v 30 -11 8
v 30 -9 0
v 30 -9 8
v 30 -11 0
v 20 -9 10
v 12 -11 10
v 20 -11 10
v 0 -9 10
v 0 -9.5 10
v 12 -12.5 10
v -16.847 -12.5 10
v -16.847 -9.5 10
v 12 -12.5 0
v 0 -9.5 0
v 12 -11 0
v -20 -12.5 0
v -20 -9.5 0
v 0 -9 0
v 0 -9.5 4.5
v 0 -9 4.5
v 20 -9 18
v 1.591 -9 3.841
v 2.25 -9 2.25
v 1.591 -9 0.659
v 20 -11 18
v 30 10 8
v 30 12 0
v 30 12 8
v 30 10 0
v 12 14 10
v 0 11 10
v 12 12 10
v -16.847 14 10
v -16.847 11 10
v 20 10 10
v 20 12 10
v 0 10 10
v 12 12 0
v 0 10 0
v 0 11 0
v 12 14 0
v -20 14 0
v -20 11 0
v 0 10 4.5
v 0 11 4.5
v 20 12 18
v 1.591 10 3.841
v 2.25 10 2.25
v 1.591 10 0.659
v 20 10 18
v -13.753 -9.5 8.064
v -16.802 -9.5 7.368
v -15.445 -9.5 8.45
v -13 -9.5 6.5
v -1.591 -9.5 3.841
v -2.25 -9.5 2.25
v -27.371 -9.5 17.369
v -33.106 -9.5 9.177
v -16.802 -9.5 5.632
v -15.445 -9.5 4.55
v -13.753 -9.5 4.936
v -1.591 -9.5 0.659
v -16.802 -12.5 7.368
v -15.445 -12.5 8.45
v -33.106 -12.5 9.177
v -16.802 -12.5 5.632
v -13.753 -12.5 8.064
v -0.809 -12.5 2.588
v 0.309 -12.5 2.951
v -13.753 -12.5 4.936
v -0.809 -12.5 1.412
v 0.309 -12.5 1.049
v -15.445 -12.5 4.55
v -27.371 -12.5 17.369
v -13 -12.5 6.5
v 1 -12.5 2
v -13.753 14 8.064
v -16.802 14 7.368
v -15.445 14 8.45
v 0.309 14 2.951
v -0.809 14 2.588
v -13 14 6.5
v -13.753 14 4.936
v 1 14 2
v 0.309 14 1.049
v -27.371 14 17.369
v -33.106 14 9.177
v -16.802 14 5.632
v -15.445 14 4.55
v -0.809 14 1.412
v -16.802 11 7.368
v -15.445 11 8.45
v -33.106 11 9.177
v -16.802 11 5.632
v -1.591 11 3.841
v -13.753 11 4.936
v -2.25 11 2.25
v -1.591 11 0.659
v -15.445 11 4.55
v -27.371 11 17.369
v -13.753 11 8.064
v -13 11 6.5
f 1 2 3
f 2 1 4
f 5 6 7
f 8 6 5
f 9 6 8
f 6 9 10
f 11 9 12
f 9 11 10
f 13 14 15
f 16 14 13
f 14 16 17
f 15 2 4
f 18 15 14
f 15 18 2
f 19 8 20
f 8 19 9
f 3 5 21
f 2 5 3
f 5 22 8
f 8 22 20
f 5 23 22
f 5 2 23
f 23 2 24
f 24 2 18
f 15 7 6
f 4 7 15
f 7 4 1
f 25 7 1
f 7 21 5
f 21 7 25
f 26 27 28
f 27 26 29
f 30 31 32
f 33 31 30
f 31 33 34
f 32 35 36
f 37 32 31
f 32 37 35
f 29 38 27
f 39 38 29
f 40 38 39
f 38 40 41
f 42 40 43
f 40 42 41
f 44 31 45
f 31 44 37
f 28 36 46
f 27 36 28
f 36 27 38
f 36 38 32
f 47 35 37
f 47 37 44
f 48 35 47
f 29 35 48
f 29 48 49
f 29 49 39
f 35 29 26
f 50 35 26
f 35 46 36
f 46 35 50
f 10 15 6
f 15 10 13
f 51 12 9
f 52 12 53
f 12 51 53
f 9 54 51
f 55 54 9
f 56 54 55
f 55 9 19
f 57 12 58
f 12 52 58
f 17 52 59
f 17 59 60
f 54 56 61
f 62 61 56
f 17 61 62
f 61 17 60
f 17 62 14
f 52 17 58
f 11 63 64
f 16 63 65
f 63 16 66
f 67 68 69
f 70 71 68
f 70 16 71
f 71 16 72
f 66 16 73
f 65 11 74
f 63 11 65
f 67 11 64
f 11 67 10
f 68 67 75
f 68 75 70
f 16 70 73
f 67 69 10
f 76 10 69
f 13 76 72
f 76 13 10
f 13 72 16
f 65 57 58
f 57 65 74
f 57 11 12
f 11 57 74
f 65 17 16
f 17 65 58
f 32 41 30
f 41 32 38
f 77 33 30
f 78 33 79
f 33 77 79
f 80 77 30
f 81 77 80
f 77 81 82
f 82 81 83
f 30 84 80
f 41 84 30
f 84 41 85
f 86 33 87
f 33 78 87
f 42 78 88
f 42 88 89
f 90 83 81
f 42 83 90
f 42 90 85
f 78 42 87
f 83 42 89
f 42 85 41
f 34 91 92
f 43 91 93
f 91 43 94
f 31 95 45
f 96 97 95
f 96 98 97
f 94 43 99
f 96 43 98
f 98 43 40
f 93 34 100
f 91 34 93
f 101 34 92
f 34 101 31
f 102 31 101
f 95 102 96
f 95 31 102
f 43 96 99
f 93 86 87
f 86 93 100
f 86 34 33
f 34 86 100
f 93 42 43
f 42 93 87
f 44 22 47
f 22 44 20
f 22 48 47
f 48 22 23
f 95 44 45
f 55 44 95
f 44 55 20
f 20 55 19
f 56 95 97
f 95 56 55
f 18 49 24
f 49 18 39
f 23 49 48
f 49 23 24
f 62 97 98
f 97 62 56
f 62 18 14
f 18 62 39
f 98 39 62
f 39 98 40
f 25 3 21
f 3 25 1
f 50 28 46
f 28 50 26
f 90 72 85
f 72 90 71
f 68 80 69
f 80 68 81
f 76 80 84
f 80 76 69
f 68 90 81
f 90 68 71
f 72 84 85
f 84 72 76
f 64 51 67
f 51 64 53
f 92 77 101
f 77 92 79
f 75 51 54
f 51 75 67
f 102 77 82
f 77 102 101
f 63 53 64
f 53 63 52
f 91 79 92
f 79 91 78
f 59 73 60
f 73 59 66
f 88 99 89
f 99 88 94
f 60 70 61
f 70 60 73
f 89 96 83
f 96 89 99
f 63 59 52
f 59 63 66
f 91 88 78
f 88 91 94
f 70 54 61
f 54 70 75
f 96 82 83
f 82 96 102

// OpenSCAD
//rotate([0,180,0]) {
//    difference() {
//        translate([1.5,0,0])cube([27,50,15]);
//        color([1,0,0])translate([1,10,0])cube([28,30,8]);
//
//        color([0,1,0])translate([7,0,0])cube([16,50,15]);
//        color([0,1,0])translate([4.5,0,0])cube([21,30,15]);
//        color([0,0,1])rotate([0,90,0])translate([-5,5,-3])cylinder(40,d1=4,d2=4);
//        color([0,0,1])rotate([0,90,0])translate([-5,45,-3])cylinder(40,d1=4,d2=4);
//    }
//    color([0,0,1])rotate([0,90,0])translate([-13,20,1])cylinder(28,d1=4,d2=4);
//}

module drawTrigger() {
difference() {
  union() {
    //left arm
    translate([0,-11,0]) cube([30,2,10]);
    translate([20,-11,0]) cube([10,2,20]);
    //right arm
    translate([0,10,0]) cube([30,2,10]);
    translate([20,10,0]) cube([10,2,20]);

    //left base
    translate([-20,-12.5,0]) cube([32,3,10]);
    translate([-20,-12.5,0]) rotate([0,-55,0])cube([10,3,16]);
    //right base
    translate([-20,11,0]) cube([32,3,10]);
    translate([-20,11,0]) rotate([0,-55,0])cube([10,3,16]);
    
    rotate([90,0,0])translate([0,2.25,-14])cylinder(26.5,d1=4.5,d2=4.5);
   
    
  }
  translate([31,-11,7]) rotate([0,-45,0])cube([10,3,20]);
  translate([31,10,7]) rotate([0,-45,0])cube([10,3,20]);
   rotate([90,0,0])translate([0,2,-20])cylinder(40,d1=2,d2=2);
  //rotate([90,0,0])translate([25,10,-20])cylinder(40,d1=4,d2=4);
  rotate([90,0,0])translate([-15,6.5,-20])cylinder(40,d1=4,d2=4);
}
}

drawTrigger();
